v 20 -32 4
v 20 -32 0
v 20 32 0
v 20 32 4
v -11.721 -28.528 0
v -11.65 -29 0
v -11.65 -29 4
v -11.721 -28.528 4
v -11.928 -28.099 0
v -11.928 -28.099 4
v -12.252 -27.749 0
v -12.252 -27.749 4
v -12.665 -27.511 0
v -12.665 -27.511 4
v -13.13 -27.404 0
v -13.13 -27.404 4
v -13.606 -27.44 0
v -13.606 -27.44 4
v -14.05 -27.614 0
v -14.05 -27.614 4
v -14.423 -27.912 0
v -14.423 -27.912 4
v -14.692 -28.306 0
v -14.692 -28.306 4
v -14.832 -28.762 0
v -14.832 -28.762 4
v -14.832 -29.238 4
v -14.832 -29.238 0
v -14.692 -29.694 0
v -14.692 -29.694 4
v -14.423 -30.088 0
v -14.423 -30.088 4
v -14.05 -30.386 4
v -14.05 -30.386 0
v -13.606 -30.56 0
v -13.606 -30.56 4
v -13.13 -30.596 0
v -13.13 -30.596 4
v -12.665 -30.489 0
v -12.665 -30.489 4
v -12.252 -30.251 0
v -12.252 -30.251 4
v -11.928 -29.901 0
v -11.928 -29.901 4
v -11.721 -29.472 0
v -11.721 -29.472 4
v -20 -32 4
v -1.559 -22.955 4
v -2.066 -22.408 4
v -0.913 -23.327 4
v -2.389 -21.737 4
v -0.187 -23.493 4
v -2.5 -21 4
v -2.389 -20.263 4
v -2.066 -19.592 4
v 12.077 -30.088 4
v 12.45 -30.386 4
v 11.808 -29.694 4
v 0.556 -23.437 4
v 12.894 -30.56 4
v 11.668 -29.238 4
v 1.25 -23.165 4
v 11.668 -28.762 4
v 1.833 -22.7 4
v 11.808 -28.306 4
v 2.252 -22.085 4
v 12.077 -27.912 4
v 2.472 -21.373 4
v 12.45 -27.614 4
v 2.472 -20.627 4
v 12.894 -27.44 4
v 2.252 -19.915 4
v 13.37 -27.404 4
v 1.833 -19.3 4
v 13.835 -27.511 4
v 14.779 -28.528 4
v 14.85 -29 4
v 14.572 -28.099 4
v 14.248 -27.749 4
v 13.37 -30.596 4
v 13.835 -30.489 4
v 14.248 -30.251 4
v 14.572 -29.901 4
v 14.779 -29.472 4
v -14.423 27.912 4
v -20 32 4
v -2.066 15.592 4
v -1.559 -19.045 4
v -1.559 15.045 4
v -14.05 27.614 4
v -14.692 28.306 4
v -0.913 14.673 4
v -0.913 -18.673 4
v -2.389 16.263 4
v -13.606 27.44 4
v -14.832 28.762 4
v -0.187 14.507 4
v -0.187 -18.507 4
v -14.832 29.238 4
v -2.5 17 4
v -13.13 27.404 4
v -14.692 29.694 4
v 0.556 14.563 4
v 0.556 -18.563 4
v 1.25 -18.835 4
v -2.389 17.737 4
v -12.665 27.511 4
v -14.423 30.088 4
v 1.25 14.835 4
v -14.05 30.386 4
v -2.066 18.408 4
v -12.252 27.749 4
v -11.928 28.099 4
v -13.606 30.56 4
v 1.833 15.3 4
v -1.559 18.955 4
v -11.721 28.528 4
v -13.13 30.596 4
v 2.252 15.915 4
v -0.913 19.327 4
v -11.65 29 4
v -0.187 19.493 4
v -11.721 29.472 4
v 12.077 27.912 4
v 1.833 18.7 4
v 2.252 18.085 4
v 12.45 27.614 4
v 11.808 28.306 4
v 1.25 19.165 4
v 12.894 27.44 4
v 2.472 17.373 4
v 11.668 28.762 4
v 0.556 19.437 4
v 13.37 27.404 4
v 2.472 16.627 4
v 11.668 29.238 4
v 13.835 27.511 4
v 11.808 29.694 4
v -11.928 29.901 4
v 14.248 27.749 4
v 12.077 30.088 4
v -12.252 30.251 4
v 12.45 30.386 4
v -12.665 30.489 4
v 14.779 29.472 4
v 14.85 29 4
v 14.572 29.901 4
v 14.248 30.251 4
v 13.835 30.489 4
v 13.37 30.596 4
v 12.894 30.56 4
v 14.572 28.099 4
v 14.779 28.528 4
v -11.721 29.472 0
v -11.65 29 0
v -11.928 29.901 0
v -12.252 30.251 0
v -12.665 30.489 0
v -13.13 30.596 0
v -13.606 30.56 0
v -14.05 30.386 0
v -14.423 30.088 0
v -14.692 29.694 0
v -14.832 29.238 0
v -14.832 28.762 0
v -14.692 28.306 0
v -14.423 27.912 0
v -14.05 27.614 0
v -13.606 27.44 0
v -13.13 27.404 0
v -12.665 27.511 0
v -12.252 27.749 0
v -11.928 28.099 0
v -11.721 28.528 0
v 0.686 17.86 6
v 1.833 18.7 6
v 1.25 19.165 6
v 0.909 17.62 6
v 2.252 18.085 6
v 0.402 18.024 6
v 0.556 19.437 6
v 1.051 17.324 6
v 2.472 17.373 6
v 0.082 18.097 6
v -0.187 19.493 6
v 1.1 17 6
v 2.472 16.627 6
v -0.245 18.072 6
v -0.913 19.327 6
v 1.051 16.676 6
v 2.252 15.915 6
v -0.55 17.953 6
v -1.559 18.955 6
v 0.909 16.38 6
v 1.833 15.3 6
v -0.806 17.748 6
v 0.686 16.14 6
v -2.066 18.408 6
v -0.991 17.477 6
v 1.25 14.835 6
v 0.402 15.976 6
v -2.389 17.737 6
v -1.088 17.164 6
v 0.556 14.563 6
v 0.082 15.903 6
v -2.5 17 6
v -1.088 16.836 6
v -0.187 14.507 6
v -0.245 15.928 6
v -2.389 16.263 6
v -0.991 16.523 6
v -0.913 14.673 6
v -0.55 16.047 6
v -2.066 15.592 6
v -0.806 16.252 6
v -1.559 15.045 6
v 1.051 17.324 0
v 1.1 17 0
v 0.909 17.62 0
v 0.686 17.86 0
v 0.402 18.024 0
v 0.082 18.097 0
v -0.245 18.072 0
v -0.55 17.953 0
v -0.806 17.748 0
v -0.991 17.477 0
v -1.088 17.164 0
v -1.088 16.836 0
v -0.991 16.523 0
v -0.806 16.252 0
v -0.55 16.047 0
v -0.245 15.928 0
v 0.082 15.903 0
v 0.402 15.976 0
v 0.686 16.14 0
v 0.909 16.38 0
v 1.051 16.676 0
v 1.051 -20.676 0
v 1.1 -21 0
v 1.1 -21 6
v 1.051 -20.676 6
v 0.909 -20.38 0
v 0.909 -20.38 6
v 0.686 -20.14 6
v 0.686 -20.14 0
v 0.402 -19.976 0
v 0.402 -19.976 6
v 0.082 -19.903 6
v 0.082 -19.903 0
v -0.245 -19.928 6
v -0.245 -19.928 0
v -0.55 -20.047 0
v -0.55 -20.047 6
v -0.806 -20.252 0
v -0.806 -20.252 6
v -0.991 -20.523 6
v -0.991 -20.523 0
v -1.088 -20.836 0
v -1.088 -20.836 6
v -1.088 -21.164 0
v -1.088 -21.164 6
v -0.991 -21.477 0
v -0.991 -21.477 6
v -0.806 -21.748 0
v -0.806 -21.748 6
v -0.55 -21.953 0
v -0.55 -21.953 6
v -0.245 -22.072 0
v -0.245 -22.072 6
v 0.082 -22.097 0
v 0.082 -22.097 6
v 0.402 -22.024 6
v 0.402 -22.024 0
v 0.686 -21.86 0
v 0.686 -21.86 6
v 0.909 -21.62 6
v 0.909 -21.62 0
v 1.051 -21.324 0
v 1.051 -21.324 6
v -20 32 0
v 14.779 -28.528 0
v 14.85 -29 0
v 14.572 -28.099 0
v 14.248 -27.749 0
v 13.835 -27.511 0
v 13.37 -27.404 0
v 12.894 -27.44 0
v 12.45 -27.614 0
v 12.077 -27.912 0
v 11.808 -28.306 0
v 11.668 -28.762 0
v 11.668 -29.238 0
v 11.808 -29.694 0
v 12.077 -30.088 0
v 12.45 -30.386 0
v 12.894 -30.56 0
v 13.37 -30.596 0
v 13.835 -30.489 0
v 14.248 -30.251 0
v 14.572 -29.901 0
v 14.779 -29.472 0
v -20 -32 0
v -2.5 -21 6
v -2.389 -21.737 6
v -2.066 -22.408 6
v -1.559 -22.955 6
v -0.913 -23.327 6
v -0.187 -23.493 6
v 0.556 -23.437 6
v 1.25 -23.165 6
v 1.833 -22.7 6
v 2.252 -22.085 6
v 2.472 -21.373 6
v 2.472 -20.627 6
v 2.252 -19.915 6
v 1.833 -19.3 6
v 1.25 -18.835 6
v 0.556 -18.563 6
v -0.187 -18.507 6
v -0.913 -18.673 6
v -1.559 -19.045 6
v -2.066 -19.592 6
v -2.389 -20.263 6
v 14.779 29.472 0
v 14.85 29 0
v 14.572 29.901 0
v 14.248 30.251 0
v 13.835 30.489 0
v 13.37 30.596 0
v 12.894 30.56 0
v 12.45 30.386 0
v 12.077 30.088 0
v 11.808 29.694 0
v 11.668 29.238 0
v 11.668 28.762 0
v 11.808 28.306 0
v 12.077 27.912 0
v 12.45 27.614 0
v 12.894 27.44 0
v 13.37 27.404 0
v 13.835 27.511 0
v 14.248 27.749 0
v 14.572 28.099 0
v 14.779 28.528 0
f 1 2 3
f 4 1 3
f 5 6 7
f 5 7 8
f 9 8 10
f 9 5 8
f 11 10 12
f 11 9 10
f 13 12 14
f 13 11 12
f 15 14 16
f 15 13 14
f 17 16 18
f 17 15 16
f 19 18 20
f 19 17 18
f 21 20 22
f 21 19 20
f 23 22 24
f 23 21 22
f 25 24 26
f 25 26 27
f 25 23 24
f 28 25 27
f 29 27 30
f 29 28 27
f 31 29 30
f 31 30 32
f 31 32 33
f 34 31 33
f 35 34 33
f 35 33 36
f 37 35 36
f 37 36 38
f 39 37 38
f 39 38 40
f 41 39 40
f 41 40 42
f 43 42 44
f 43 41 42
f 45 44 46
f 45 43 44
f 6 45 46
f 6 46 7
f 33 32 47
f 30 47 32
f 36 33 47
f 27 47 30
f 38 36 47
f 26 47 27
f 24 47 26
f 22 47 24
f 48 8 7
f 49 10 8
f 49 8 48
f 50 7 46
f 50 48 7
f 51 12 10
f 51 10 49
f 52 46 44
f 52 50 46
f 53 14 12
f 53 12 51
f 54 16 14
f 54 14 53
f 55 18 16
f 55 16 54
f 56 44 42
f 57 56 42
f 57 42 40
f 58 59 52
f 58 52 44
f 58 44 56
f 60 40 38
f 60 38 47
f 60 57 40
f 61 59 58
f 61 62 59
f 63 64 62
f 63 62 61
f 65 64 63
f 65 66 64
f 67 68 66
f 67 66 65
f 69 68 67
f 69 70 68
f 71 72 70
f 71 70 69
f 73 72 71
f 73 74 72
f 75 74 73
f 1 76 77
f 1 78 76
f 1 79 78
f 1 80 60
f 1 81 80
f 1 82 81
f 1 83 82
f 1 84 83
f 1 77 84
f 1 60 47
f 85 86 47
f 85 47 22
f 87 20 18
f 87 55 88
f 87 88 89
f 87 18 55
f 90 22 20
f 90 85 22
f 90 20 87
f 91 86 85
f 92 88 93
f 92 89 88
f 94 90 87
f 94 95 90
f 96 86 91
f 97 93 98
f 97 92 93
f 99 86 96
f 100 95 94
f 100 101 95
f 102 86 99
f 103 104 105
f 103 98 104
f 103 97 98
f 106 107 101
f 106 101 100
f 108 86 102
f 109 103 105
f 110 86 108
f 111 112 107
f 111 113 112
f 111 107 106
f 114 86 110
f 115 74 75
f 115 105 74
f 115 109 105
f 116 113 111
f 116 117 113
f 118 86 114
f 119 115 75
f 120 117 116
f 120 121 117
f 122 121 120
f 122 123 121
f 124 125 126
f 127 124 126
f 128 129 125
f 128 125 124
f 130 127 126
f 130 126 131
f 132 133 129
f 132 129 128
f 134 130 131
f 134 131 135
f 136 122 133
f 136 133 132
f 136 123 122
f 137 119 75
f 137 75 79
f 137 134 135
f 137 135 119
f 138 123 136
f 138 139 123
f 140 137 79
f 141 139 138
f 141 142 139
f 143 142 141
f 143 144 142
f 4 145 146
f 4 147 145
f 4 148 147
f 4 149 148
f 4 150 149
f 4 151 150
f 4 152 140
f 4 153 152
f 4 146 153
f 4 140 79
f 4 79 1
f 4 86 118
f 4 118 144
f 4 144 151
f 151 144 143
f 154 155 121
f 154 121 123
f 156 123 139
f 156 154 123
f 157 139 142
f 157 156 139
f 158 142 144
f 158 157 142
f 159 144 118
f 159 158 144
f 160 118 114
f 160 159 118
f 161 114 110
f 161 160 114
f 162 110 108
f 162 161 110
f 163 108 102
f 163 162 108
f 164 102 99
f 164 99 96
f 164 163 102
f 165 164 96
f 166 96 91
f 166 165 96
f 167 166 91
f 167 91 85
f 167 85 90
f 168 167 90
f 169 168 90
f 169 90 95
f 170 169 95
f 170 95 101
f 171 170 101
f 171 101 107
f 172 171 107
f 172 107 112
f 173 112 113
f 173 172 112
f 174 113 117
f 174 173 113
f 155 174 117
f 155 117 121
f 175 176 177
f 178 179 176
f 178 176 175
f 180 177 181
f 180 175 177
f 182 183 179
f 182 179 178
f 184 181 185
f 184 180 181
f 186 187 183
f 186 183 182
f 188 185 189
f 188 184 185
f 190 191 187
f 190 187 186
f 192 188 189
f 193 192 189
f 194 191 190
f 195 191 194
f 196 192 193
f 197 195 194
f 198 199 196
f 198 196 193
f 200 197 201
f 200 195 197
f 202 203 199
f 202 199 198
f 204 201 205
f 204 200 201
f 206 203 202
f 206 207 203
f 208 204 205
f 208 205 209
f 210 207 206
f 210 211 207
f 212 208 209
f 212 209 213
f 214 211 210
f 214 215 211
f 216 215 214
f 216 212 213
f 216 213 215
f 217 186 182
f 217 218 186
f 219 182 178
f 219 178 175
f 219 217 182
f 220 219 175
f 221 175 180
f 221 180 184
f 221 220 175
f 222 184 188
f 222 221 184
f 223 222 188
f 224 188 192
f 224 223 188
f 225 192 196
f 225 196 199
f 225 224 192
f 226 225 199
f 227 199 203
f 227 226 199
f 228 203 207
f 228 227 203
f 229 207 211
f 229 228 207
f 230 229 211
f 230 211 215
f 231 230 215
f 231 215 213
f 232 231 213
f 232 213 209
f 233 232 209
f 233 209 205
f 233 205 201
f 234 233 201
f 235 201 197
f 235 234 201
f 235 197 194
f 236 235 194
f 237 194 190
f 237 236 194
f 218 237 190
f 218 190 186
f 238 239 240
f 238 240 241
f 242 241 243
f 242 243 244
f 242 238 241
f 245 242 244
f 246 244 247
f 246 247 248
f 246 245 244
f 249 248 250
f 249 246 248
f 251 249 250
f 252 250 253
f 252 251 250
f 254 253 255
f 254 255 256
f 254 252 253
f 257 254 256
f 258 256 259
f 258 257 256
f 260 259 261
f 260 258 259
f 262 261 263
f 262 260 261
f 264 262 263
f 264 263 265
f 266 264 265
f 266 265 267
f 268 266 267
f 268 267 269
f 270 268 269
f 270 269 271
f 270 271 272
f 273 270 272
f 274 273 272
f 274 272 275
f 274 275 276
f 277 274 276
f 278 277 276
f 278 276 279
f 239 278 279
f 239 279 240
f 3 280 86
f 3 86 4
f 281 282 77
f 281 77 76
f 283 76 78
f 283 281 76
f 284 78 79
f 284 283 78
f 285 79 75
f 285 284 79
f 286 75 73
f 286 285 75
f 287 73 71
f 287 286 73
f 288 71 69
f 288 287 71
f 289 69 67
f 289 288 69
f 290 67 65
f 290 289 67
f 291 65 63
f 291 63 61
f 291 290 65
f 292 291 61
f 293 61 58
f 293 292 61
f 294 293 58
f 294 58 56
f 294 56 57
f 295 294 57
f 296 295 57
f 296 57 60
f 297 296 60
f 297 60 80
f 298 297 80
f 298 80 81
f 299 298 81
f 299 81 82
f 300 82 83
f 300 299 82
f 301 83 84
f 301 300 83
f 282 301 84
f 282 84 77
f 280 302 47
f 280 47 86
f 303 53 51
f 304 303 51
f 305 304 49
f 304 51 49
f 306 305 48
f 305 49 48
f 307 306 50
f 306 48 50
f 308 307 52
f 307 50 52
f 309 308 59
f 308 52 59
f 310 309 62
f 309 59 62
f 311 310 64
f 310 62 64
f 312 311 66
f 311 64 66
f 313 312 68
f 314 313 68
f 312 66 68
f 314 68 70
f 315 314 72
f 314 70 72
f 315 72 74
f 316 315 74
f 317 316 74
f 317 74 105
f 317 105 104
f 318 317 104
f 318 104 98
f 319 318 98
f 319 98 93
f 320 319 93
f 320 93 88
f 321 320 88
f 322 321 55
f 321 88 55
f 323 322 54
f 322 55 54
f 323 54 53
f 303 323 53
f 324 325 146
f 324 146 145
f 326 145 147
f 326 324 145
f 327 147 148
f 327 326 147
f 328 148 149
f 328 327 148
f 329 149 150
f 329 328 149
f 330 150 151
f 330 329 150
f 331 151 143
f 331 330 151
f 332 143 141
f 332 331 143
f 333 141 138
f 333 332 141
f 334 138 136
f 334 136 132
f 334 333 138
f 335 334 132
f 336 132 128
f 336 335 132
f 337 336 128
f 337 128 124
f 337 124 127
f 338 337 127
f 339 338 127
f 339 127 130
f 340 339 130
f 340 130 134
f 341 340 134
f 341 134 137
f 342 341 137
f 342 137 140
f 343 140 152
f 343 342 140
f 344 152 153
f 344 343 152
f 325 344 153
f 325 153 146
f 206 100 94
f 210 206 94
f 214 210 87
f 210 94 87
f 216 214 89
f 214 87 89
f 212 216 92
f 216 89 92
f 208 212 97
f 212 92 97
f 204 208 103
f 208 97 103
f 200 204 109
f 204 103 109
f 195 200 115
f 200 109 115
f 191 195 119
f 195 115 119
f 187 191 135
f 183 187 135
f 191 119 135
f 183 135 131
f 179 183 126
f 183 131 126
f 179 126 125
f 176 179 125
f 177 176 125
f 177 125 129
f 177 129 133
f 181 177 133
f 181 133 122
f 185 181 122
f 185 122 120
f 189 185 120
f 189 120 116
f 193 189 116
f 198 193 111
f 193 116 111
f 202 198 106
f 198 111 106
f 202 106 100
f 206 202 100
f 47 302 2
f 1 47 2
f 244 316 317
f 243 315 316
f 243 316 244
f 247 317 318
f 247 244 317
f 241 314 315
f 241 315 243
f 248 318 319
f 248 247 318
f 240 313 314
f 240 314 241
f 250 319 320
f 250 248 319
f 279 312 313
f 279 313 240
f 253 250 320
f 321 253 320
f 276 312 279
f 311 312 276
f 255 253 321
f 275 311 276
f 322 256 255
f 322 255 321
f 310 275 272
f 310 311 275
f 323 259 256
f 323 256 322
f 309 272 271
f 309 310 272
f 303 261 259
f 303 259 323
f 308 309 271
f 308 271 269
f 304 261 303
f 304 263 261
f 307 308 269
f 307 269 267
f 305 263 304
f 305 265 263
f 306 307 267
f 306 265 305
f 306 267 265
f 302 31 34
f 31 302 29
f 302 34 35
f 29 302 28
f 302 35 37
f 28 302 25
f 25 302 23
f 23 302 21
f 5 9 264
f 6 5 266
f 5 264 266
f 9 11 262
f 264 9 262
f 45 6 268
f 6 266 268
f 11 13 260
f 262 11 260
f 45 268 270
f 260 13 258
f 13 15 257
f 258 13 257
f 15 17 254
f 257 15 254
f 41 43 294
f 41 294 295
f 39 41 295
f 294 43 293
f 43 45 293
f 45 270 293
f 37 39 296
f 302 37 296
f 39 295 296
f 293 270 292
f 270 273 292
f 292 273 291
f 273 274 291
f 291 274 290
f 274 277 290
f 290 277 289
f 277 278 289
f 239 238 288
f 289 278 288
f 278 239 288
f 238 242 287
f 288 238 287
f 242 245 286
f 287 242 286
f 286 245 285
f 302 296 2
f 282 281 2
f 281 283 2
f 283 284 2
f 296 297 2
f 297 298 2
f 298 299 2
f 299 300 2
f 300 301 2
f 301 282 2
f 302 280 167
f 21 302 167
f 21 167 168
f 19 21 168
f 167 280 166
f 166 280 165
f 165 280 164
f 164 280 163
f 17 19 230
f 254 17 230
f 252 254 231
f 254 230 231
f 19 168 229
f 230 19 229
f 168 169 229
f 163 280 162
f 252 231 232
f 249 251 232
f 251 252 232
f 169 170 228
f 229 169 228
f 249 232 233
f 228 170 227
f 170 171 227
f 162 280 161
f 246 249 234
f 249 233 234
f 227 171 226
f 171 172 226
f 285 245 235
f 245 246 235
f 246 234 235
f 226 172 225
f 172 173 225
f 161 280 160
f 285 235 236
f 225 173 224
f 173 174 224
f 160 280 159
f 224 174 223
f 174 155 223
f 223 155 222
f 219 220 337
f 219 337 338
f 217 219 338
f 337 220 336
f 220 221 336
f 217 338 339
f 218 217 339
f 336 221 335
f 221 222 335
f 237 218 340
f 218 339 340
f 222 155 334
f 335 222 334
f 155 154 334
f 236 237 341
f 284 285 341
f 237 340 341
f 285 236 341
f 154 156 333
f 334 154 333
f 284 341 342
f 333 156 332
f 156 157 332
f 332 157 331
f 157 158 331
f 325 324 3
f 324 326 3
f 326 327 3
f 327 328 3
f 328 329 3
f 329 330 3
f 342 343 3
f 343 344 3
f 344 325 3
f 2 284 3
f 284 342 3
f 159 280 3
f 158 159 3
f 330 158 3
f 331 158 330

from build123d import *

# Parameters (mm, degrees)
SKETCH_1_W      = 40
SKETCH_1_H      = 64
SKETCH_1_R      = 1.6
SKETCH_1_R_2    = 1.1
EXTRUDE_1_DEPTH = 4
SKETCH_2_R      = 2.5
SKETCH_2_R_2    = 1.1
EXTRUDE_2_DEPTH = 2


with BuildPart() as part:
    # Эскиз1 → Бобышка-Вытянуть1 (new body)
    with BuildSketch(Plane.XY):
        Rectangle(SKETCH_1_W, SKETCH_1_H)
        with Locations((-13.25, 29)):
            Circle(SKETCH_1_R, mode=Mode.SUBTRACT)
        with Locations((13.25, 29)):
            Circle(SKETCH_1_R, mode=Mode.SUBTRACT)
        with Locations((-13.25, -29)):
            Circle(SKETCH_1_R, mode=Mode.SUBTRACT)
        with Locations((13.25, -29)):
            Circle(SKETCH_1_R, mode=Mode.SUBTRACT)
        with Locations((0, -21)):
            Circle(SKETCH_1_R_2, mode=Mode.SUBTRACT)
        with Locations((0, 17)):
            Circle(SKETCH_1_R_2, mode=Mode.SUBTRACT)
    extrude(amount=EXTRUDE_1_DEPTH)

    # Эскиз2 → Бобышка-Вытянуть2 (add)
    # profile 1 of 2: a face of its own
    with BuildSketch(Plane.XY.offset(4)):
        with Locations(Location((0, 17, 0), (0, 0, 180))):
            Circle(SKETCH_2_R)
        with Locations((0, 17)):
            Circle(SKETCH_2_R_2, mode=Mode.SUBTRACT)
    # profile 2 of 2: a face of its own
    with BuildSketch(Plane.XY.offset(4)):
        with Locations(Location((0, -21, 0), (0, 0, 180))):
            Circle(SKETCH_2_R)
        with Locations((0, -21)):
            Circle(SKETCH_2_R_2, mode=Mode.SUBTRACT)
    extrude(amount=EXTRUDE_2_DEPTH)


solid = part.part
